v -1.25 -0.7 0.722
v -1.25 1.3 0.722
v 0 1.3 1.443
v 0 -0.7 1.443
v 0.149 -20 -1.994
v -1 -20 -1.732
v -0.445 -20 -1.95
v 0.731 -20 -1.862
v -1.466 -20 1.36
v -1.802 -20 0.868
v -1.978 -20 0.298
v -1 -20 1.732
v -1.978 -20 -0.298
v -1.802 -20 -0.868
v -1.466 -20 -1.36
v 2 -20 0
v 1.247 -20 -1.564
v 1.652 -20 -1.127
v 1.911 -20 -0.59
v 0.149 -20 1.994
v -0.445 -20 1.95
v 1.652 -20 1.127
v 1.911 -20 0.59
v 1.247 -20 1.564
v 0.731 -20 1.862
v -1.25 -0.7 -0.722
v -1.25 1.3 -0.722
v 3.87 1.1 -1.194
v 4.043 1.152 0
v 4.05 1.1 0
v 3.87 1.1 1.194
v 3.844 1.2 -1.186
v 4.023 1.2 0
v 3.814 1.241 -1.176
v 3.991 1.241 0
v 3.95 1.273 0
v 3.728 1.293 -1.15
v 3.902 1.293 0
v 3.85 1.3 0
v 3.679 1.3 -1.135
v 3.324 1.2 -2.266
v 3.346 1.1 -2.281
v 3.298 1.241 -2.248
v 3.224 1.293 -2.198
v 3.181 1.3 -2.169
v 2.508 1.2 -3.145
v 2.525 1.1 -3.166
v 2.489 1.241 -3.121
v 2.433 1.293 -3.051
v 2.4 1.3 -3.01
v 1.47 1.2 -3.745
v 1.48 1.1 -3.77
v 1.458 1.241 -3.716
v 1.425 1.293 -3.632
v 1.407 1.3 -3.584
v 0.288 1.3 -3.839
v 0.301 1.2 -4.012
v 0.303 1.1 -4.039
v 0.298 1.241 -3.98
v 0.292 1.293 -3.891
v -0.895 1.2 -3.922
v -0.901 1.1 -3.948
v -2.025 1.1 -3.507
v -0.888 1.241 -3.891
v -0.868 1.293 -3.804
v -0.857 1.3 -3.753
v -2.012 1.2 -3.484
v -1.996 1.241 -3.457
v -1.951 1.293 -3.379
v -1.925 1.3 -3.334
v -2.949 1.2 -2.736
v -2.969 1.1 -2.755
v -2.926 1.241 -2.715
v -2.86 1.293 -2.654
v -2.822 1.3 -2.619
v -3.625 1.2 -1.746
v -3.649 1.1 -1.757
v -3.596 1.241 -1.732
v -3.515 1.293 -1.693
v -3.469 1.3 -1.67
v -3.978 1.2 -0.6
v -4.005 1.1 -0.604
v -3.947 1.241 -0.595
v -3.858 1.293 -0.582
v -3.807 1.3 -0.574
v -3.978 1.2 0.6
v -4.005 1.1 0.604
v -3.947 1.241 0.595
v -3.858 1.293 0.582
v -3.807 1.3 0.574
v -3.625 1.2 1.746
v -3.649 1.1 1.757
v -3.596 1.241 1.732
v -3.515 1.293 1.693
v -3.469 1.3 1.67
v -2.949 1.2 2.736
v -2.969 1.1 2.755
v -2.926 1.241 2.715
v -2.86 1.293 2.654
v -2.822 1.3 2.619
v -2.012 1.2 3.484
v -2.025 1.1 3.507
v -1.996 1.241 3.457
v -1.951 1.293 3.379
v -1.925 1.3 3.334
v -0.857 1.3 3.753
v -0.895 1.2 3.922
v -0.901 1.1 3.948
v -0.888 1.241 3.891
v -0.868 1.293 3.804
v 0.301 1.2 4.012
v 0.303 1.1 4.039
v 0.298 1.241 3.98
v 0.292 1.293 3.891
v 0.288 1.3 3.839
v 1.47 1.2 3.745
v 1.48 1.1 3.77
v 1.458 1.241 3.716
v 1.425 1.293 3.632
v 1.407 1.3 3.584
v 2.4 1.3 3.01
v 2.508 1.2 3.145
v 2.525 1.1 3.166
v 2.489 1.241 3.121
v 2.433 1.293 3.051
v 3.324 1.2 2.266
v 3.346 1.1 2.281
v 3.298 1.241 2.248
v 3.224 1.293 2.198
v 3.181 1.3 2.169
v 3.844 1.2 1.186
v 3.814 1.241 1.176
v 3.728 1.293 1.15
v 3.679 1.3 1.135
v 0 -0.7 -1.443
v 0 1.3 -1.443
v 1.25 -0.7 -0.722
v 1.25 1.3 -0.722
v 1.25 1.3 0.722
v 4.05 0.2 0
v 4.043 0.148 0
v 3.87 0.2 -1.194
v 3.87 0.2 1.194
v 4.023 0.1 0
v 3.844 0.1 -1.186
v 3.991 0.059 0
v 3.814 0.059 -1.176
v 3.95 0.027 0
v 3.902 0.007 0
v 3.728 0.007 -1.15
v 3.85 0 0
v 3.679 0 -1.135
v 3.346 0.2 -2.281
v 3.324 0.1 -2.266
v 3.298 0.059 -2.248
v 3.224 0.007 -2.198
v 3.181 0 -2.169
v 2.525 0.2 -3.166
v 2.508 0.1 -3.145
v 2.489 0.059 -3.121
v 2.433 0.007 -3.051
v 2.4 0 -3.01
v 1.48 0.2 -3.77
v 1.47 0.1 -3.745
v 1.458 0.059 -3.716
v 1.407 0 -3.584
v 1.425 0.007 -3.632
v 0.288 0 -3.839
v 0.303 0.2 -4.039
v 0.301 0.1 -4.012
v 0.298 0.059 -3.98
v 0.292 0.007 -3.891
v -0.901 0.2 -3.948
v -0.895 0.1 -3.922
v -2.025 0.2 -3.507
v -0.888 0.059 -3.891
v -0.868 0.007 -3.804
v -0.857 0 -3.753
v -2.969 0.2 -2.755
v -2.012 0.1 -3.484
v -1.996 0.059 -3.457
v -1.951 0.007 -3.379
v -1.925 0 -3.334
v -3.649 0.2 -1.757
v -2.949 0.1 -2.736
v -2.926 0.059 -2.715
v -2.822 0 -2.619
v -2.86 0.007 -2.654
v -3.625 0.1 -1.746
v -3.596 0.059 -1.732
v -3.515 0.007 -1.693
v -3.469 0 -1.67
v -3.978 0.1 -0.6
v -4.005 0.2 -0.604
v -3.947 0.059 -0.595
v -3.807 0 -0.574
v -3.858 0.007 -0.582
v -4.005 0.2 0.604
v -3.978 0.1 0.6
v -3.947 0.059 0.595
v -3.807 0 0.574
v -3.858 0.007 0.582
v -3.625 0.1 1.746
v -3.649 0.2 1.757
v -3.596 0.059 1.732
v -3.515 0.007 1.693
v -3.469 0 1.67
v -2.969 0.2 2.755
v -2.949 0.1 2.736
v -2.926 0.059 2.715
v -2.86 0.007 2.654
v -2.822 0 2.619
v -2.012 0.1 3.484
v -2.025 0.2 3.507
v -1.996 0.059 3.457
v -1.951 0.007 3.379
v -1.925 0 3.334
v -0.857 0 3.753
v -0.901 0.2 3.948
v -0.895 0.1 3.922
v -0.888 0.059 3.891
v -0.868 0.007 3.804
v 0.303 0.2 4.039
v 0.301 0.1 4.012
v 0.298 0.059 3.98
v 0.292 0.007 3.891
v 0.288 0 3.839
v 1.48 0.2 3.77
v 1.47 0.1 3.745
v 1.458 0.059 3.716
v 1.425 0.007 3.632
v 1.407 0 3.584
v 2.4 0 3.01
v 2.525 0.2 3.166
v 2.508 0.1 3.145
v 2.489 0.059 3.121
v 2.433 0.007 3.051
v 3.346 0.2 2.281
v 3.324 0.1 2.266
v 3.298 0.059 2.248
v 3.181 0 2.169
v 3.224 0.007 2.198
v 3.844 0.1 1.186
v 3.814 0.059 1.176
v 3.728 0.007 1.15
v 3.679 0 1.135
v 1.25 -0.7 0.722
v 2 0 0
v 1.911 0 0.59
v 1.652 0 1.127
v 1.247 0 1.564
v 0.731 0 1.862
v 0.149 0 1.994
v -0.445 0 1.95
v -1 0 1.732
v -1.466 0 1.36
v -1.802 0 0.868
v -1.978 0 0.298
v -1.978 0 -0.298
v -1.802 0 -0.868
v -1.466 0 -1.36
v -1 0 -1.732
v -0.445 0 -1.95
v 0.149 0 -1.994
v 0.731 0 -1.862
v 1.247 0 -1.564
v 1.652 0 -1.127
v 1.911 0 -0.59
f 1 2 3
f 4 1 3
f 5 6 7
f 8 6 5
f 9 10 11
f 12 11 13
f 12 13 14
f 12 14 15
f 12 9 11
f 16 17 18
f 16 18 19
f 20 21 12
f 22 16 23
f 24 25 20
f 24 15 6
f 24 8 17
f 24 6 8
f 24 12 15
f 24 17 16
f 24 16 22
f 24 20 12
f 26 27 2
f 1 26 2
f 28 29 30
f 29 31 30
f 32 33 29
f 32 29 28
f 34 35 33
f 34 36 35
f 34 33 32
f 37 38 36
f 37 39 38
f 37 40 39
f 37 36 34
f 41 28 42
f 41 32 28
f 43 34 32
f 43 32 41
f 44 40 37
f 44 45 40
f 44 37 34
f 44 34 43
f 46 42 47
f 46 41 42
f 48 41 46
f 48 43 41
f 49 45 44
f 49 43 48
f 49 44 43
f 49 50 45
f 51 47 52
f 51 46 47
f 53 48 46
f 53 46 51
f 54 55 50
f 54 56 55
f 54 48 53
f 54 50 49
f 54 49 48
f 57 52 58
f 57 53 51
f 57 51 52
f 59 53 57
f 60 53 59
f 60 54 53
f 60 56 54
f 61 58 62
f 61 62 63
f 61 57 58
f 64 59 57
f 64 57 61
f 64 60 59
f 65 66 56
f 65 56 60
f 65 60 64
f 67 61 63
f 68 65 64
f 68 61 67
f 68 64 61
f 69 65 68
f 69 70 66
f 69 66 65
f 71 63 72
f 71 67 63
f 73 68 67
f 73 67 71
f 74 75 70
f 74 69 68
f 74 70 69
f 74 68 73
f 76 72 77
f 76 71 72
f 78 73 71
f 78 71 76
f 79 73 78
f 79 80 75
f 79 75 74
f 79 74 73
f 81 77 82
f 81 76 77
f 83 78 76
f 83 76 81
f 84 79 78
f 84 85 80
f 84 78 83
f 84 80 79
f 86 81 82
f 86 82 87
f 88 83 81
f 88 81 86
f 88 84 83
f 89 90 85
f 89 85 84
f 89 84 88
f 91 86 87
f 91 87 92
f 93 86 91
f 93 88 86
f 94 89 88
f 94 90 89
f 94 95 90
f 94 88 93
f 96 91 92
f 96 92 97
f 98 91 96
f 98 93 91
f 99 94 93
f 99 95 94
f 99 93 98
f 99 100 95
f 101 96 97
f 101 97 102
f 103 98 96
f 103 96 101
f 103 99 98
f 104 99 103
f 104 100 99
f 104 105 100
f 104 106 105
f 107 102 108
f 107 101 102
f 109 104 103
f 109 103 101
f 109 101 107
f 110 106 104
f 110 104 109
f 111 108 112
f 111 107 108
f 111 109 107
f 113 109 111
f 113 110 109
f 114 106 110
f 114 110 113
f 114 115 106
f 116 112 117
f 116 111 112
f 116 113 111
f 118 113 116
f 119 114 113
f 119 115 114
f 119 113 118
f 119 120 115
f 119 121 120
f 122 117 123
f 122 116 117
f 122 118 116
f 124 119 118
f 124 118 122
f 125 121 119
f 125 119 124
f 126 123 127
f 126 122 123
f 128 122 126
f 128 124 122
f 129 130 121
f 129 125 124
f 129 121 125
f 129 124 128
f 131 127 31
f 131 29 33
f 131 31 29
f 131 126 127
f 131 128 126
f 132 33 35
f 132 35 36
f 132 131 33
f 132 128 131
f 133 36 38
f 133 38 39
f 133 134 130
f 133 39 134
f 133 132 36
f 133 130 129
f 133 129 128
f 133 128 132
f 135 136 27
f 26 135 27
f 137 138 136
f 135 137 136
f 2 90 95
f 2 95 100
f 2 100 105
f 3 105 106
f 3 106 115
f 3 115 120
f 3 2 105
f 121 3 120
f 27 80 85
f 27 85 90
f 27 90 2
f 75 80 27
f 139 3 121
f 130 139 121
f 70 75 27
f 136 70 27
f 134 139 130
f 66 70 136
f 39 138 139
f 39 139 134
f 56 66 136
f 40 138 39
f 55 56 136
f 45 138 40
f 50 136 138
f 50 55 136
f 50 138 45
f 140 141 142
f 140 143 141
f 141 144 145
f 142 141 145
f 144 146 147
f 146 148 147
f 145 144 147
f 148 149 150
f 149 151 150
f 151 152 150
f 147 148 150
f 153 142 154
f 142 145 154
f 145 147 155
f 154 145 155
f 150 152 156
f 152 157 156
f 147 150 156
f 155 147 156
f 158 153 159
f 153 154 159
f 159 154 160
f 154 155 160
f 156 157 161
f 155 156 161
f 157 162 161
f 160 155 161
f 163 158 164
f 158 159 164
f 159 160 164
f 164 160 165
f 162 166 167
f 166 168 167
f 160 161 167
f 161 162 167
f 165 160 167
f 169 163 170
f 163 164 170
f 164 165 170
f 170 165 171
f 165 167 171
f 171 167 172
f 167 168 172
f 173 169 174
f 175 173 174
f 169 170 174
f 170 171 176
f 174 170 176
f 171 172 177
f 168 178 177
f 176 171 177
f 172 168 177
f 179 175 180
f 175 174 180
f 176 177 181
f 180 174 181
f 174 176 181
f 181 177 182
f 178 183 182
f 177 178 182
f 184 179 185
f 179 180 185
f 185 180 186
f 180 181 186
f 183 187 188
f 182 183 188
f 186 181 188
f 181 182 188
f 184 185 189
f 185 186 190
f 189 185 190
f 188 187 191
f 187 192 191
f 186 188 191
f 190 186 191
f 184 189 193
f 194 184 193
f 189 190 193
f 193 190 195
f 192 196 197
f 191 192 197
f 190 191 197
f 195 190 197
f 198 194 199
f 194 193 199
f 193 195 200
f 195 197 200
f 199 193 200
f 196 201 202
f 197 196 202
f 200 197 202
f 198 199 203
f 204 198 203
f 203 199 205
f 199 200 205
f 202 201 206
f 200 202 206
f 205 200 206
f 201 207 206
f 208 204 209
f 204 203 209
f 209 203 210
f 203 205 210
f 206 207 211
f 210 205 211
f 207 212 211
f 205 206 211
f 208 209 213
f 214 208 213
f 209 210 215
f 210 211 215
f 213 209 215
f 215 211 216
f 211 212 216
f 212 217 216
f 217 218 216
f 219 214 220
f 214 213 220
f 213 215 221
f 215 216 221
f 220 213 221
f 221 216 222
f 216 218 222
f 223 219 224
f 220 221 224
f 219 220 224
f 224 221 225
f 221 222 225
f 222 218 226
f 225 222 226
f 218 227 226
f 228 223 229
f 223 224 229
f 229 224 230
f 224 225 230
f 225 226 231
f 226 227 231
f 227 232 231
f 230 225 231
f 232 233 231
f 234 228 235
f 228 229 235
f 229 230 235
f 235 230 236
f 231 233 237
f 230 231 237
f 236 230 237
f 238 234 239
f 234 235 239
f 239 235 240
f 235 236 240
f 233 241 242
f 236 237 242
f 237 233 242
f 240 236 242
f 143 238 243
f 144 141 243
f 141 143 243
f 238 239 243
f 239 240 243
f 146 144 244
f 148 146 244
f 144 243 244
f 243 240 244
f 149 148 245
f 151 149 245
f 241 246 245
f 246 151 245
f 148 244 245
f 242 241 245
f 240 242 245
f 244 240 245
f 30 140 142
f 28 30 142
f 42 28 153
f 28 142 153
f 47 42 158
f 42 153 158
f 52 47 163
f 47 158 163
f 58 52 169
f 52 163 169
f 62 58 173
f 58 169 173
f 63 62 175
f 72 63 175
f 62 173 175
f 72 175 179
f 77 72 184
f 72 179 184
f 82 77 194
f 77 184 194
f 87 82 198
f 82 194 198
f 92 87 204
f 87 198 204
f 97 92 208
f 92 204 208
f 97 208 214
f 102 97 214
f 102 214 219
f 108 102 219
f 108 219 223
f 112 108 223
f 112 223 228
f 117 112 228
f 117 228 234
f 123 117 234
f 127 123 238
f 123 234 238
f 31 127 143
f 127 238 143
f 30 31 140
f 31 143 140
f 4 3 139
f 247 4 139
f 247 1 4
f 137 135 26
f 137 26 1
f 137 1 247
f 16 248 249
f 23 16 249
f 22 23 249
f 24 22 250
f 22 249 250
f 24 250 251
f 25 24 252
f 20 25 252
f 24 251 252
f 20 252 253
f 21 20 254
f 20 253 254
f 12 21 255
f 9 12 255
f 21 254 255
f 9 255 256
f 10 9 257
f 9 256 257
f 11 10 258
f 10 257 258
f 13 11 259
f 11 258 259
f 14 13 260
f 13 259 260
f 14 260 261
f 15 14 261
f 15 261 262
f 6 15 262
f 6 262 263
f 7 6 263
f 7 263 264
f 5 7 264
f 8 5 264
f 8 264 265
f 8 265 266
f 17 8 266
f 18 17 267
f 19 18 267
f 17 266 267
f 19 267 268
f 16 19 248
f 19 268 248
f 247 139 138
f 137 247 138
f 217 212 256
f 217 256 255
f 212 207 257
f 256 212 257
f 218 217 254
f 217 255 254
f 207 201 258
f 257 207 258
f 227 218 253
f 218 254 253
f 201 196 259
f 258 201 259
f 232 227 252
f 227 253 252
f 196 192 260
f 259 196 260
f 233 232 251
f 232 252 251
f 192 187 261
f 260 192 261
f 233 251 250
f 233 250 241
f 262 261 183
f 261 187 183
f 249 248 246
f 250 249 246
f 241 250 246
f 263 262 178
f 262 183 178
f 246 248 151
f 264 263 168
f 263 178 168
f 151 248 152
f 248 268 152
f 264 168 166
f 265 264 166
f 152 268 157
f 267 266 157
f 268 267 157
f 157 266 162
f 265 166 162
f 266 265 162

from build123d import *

# Parameters (mm, degrees)
SKETCH1_R           = 4.05
BOSS_EXTRUDE1_DEPTH = 1.3
FILLET1_R           = 0.2
SKETCH2_R           = 2
BOSS_EXTRUDE2_DEPTH = 20
CUT_EXTRUDE1_DEPTH  = 2


with BuildPart() as part:
    # Sketch1 → Boss-Extrude1 (new body)
    with BuildSketch(Plane(origin=(0, 0, 0), x_dir=(1, 0, 0), z_dir=(0, 1, 0))):
        Circle(SKETCH1_R)
    extrude(amount=BOSS_EXTRUDE1_DEPTH)

    # Fillet1
    fillet1_edges = [part.edges().sort_by_distance(p)[0] for p in [
        (-4.05, 0, 0),
        (-4.05, 1.3, 0),
    ]]
    fillet(fillet1_edges, radius=FILLET1_R)

    # Sketch2 → Boss-Extrude2 (add)
    with BuildSketch(Plane.XZ):
        Circle(SKETCH2_R)
    extrude(amount=BOSS_EXTRUDE2_DEPTH)

    # Sketch3 → Cut-Extrude1 (cut)
    with BuildSketch(Plane(origin=(0, 1.3, 0), x_dir=(1, 0, 0), z_dir=(0, 1, 0))):
        Polygon((-1.25, -0.721687836), (0, -1.443375673), (1.25, -0.721687836), (1.25, 0.721687836), (0, 1.443375673), (-1.25, 0.721687836), align=None)
    extrude(amount=-CUT_EXTRUDE1_DEPTH, mode=Mode.SUBTRACT)


solid = part.part
